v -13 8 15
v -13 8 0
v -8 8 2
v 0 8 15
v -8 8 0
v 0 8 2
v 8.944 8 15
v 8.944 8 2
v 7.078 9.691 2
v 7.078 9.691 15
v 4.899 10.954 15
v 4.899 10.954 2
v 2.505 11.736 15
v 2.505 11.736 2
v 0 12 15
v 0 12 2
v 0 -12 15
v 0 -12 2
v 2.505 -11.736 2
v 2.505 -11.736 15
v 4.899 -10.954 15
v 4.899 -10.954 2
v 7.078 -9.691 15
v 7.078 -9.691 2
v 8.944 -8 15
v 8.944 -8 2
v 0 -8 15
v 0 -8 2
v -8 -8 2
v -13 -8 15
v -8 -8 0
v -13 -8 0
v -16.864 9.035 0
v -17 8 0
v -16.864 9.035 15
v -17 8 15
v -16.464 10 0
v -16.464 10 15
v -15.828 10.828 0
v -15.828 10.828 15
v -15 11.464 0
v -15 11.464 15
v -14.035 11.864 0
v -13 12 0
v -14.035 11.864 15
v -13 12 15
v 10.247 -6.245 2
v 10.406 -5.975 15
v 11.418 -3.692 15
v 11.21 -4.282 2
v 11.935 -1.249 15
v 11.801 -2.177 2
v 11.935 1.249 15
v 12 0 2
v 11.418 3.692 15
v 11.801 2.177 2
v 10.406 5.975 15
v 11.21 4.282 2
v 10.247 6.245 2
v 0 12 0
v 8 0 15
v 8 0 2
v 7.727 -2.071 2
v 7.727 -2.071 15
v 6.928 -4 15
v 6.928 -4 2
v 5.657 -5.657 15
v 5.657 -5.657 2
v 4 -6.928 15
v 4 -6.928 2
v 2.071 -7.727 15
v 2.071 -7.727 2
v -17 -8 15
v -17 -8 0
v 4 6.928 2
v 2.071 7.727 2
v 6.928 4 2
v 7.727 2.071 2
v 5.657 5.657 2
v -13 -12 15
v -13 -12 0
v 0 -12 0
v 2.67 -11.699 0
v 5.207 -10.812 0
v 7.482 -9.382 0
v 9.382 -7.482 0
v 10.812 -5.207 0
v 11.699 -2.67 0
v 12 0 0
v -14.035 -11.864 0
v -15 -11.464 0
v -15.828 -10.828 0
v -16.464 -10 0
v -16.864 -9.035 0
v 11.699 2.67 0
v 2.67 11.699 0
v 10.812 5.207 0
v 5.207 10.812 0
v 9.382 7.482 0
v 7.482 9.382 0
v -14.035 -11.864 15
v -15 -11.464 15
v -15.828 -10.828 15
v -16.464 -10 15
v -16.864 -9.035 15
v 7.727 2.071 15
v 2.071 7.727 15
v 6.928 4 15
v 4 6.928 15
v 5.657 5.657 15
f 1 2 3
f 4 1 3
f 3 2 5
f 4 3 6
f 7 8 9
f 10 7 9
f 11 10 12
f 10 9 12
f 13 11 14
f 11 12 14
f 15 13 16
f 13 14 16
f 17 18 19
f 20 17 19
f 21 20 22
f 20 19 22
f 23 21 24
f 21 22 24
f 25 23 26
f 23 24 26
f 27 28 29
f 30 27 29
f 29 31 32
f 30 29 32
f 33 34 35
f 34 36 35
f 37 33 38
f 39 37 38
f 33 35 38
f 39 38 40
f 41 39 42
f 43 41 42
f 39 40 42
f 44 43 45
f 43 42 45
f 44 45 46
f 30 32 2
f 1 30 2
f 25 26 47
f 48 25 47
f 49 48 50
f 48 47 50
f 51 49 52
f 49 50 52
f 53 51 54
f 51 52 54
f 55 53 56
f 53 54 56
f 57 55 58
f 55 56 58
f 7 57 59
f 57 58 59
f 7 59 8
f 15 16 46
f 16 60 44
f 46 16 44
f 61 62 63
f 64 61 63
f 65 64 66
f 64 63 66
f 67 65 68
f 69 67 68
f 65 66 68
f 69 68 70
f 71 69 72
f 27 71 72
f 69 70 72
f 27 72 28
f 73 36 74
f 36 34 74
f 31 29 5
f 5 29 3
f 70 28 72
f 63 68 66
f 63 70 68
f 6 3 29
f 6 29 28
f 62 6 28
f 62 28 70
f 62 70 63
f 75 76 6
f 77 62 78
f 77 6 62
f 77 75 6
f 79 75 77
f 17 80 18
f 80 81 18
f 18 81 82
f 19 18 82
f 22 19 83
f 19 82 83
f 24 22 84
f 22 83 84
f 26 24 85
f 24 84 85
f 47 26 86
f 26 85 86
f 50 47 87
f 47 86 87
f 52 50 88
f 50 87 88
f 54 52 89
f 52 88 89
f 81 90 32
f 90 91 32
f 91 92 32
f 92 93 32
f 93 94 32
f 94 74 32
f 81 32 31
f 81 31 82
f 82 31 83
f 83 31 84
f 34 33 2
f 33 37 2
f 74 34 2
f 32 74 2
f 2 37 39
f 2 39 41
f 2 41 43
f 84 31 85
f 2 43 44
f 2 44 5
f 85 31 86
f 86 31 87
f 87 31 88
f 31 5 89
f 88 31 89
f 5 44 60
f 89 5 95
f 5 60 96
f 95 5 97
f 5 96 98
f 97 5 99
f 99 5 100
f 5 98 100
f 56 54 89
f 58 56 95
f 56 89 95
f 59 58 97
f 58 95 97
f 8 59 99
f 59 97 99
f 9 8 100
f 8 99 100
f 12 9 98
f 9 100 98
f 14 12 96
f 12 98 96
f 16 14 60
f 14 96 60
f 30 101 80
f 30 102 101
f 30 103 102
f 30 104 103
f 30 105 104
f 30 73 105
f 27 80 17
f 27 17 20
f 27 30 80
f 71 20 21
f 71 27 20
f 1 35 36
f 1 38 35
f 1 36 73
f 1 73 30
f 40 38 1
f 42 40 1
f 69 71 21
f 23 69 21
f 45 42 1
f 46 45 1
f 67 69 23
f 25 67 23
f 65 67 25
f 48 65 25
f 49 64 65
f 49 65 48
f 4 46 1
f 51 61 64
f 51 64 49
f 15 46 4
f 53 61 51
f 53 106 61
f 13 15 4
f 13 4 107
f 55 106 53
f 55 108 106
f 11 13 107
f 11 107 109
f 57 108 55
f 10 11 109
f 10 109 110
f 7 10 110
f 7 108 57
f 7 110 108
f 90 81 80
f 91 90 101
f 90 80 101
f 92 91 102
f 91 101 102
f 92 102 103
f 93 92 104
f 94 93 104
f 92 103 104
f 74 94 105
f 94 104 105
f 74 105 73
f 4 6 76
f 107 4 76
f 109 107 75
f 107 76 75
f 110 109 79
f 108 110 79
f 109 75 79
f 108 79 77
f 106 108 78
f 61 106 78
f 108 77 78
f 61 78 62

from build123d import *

# Parameters (mm, degrees)
F1_DEPTH = 2
F3_DEPTH = 13
F4_W     = 5
F4_H     = 16
F5_DEPTH = 25
F6_R     = 4


with BuildPart() as f1:
    # F0 (on Top) → F1 (new body)
    with BuildSketch(Plane.XY):
        with BuildLine():
            ThreePointArc((0, -12), (-12, 5e-09), (9.9e-09, 12))
            Line((9.9e-09, 12), (-17, 12))
            Line((-17, 12), (-17, -12))
            Line((-17, -12), (0, -12))
        make_face()
        with BuildLine():
            ThreePointArc((0, -12), (8.4852813742, -8.4852813742), (12, 0))
            ThreePointArc((12, 0), (8.4852813777, 8.4852813707), (9.9e-09, 12))
            ThreePointArc((9.9e-09, 12), (-12, 5e-09), (0, -12))
        make_face()
    extrude(amount=F1_DEPTH)

    # F2 (on face) → F3 (join)
    with BuildSketch(Plane.XY.offset(2)):
        with BuildLine():
            Line((-13, 8), (0, 8))
            Line((0, 8), (8.94427191, 8))
            ThreePointArc((8.94427191, 8), (4.8989794901, 10.9544511481), (9.9e-09, 12))
            Line((9.9e-09, 12), (-17, 12))
            Line((-17, 12), (-17, -12))
            Line((-17, -12), (0, -12))
            ThreePointArc((0, -12), (4.8989794856, -10.9544511501), (8.94427191, -8))
            Line((8.94427191, -8), (0, -8))
            Line((0, -8), (-13, -8))
            Line((-13, -8), (-13, 8))
        make_face()
        with BuildLine():
            ThreePointArc((0, 8), (5.6568542495, 5.6568542495), (8, 0))
            ThreePointArc((8, 0), (5.6568542495, -5.6568542495), (0, -8))
            Line((0, -8), (8.94427191, -8))
            ThreePointArc((8.94427191, -8), (12, 0), (8.94427191, 8))
            Line((8.94427191, 8), (0, 8))
        make_face()
    extrude(amount=F3_DEPTH)

    # F4 (on face) → F5 (cut)
    with BuildSketch(Plane.XY.offset(2)):
        with Locations((-10.5, 0)):
            Rectangle(F4_W, F4_H)
    extrude(amount=-F5_DEPTH, mode=Mode.SUBTRACT)

    # F6
    f6_edges = [f1.edges().sort_by_distance(p)[0] for p in [
        (-17, 12, 7.5),
        (-17, -12, 7.5),
    ]]
    fillet(f6_edges, radius=F6_R)


solid = f1.part
